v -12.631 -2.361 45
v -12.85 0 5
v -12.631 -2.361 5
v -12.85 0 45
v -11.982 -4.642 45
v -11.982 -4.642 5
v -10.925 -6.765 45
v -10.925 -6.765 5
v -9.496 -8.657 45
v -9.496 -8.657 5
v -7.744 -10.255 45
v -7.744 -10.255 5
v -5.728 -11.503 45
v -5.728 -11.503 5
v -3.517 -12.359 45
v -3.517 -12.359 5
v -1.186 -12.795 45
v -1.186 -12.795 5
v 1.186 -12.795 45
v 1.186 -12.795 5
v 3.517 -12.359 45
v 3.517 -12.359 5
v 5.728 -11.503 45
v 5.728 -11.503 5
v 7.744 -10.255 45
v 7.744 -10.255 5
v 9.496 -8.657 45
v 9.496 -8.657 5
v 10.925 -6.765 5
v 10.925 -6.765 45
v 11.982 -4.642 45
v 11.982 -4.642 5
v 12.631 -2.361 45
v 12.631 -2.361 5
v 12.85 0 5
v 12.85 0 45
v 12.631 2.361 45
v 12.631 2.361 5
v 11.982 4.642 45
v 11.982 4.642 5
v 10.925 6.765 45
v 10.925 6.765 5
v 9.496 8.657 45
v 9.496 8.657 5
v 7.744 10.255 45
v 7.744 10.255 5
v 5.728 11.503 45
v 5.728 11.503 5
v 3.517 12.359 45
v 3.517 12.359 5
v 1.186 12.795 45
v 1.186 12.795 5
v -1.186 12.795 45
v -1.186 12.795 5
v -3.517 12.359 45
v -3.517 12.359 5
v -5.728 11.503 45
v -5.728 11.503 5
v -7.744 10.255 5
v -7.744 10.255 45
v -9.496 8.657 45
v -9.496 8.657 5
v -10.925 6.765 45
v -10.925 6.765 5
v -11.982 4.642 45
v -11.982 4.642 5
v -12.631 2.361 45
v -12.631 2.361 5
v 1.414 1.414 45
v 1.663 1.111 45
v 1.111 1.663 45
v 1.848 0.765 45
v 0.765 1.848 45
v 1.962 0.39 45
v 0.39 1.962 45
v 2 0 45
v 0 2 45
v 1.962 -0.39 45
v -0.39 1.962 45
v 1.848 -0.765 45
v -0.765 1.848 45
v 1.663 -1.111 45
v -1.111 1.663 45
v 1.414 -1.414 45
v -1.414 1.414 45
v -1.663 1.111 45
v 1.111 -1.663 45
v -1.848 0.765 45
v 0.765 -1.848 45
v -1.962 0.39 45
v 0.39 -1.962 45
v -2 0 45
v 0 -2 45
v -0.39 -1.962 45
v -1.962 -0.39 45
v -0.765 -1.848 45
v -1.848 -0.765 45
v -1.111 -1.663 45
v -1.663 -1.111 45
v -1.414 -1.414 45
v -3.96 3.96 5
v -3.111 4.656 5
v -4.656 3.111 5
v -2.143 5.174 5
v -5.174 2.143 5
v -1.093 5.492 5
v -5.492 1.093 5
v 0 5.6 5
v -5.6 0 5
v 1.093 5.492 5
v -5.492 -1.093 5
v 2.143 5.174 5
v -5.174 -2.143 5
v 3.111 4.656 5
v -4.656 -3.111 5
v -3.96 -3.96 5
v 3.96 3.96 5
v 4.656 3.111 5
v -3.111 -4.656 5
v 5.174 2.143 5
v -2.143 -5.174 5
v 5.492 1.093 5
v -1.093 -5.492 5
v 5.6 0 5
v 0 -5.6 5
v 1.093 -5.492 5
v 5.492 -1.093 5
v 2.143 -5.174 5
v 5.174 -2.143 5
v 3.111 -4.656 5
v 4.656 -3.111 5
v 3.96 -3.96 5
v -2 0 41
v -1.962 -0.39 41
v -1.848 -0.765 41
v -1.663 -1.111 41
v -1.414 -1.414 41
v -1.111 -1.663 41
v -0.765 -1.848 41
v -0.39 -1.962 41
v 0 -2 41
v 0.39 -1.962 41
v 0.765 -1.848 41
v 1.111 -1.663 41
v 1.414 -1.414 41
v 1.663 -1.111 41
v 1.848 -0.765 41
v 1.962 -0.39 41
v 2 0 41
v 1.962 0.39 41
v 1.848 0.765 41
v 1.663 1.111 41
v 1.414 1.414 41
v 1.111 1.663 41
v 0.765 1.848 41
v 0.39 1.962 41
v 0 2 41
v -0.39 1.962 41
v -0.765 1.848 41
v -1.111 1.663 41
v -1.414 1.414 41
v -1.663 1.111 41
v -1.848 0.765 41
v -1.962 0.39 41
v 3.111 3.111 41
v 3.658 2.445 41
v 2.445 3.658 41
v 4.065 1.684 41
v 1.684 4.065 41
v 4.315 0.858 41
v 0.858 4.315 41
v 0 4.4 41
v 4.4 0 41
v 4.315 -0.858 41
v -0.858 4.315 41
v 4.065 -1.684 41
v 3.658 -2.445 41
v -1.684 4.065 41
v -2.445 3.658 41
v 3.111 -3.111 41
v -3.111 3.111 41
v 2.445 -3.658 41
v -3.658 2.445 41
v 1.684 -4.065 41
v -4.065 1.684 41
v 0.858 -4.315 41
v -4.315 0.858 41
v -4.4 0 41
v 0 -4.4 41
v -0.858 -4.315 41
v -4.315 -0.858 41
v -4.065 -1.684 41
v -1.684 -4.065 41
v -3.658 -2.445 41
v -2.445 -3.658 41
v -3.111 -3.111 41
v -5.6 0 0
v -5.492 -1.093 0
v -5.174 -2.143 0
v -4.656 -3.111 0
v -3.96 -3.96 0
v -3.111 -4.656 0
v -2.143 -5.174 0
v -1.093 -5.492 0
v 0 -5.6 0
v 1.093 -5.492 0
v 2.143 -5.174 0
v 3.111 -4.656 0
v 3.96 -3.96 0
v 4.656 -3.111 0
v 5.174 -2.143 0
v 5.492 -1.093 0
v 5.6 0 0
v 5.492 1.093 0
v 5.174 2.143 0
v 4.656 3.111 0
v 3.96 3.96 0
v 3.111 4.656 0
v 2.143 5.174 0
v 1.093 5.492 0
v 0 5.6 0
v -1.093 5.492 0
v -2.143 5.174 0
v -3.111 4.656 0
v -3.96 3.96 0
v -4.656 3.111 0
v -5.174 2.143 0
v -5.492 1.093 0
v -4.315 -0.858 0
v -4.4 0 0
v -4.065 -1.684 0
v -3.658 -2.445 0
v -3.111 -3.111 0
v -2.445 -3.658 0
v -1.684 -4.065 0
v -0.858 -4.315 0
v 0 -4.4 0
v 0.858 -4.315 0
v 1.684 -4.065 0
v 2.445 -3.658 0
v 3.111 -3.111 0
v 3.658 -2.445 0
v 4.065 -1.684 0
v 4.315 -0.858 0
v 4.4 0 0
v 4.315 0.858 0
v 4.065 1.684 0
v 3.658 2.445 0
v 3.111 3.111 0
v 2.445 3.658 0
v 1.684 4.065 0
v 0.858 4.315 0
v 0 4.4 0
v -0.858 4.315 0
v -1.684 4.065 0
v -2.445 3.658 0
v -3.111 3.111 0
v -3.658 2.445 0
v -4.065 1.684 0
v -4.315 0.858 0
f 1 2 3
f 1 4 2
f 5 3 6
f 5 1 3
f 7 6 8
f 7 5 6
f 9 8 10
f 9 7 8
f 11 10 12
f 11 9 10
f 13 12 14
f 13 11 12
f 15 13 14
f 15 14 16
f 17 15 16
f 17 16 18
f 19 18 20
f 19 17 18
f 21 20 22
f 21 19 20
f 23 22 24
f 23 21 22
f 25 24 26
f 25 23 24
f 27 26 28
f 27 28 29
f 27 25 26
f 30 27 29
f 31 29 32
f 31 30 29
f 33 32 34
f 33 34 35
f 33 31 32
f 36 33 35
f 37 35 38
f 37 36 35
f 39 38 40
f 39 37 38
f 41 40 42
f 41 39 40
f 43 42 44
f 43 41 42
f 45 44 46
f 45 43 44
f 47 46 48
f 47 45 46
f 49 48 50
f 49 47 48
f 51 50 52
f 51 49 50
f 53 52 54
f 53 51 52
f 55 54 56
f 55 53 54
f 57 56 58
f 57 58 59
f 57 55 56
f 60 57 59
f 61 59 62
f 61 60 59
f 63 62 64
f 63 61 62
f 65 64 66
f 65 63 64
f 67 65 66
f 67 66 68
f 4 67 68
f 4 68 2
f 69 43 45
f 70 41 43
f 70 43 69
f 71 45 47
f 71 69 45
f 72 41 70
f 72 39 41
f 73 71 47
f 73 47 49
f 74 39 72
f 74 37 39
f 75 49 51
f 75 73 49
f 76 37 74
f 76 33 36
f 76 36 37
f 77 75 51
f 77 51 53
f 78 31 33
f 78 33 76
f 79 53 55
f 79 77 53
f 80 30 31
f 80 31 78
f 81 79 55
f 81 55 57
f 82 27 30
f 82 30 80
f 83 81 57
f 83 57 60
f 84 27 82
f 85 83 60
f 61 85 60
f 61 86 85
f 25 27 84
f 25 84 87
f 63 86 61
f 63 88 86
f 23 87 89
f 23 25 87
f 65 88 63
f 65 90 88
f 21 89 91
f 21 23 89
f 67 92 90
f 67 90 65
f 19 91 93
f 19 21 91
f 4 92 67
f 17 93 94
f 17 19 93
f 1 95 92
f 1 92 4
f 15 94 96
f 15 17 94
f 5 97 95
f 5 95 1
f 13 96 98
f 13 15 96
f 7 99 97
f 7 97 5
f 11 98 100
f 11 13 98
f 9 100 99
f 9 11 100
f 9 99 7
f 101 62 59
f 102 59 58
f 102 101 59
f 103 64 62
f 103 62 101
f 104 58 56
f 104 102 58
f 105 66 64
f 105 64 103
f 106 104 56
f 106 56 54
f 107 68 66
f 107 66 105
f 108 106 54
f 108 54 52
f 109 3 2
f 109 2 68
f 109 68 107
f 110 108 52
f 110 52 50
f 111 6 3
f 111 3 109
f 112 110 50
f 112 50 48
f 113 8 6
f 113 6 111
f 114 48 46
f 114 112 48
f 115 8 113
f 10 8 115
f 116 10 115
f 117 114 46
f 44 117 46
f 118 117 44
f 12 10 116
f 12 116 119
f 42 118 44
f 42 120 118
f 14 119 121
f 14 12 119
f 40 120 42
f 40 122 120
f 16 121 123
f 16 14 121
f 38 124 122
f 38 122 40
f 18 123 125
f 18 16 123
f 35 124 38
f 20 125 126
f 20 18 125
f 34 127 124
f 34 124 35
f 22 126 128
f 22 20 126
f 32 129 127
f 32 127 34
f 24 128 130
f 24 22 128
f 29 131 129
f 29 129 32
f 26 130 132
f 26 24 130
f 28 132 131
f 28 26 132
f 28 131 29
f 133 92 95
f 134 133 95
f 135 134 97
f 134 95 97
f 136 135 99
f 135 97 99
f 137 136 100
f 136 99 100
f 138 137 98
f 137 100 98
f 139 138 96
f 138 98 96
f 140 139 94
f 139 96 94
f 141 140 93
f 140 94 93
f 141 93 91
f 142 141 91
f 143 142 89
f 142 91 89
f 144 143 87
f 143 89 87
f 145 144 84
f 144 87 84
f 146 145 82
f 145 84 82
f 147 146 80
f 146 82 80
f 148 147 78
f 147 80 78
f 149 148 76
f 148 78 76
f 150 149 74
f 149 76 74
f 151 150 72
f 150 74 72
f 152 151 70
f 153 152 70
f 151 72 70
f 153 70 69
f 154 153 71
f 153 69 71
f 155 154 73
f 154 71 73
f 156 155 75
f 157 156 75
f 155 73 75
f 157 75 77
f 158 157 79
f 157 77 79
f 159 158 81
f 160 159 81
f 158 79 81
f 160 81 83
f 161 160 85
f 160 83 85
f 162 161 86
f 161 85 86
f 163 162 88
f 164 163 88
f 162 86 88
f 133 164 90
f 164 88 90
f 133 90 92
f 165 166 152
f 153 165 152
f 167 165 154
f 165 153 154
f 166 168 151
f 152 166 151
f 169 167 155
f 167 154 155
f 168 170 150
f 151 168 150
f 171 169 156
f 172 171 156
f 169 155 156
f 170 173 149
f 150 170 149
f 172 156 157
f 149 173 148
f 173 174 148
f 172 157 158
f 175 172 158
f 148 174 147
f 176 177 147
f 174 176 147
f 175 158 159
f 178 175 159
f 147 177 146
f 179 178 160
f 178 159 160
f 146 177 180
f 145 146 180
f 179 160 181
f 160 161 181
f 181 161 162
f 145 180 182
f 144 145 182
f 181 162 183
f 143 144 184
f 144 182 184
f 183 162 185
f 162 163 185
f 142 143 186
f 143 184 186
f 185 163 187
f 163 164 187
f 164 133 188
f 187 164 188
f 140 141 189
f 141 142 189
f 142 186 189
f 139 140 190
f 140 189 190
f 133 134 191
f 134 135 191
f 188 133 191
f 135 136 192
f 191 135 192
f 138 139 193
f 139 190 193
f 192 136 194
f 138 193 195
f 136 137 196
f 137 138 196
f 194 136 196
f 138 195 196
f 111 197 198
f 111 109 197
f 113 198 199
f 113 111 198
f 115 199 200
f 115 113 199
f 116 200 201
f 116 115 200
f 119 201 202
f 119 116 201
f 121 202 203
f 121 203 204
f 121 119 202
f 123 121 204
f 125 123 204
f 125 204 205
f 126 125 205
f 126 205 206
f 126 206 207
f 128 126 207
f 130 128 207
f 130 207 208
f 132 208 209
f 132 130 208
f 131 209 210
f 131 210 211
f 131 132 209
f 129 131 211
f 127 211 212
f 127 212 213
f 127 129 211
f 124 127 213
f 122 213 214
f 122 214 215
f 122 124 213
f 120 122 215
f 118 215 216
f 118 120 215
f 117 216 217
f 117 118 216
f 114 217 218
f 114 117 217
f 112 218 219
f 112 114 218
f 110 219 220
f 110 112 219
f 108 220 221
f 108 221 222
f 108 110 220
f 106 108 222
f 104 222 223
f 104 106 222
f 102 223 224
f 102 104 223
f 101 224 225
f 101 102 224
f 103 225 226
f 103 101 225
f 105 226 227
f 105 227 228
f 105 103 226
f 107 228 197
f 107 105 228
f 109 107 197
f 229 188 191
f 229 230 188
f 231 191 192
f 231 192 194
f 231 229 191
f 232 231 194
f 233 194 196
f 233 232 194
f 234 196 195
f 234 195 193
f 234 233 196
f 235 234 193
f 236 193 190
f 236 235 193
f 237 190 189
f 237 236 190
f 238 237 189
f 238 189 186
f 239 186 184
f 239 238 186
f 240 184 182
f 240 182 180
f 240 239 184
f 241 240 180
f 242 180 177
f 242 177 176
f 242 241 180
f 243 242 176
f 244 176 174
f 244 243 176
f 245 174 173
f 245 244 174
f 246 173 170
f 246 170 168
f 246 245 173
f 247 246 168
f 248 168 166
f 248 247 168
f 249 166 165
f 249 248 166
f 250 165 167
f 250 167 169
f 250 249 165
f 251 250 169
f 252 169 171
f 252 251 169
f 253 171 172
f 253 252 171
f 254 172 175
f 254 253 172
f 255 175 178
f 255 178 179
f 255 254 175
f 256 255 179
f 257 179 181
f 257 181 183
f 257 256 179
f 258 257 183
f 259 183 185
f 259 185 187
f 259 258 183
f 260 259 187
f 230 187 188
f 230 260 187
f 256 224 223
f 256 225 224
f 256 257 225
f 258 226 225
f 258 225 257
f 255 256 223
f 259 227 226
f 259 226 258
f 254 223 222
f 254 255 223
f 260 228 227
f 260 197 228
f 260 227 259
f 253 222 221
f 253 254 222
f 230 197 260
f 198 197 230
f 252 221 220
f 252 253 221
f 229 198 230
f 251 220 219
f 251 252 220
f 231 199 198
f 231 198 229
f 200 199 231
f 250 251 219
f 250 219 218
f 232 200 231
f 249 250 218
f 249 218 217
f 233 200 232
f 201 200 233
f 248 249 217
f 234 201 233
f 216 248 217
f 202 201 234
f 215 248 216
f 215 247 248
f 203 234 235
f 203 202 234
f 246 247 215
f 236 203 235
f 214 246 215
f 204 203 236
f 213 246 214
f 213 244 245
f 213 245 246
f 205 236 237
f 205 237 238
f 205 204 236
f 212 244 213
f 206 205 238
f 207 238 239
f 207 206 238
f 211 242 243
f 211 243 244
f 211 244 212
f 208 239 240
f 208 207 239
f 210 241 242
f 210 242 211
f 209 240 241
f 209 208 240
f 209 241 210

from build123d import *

# Parameters (mm, degrees)
SKETCH001_R   = 4.4
SKETCH001_R_2 = 2
PAD_DEPTH     = 4


with BuildPart() as part:
    # Sketch → Revolution (revolve)
    with BuildSketch(Plane.XZ):
        Polygon((-4.4, 0), (-5.6, 0), (-5.6, 5), (-12.85, 5), (-12.85, 45), (-4.4, 45), align=None)
    revolve(axis=Axis((0, 0, 0), (0, 0, 1)))

    # Sketch001 (on Face5 of Revolution) → Pad (new body)
    with BuildSketch(Plane(origin=(0, 0, 45), x_dir=(-1, 0, 0), z_dir=(0, 0, 1))):
        Circle(SKETCH001_R)
        Circle(SKETCH001_R_2, mode=Mode.SUBTRACT)
    extrude(amount=-PAD_DEPTH)


solid = part.part
